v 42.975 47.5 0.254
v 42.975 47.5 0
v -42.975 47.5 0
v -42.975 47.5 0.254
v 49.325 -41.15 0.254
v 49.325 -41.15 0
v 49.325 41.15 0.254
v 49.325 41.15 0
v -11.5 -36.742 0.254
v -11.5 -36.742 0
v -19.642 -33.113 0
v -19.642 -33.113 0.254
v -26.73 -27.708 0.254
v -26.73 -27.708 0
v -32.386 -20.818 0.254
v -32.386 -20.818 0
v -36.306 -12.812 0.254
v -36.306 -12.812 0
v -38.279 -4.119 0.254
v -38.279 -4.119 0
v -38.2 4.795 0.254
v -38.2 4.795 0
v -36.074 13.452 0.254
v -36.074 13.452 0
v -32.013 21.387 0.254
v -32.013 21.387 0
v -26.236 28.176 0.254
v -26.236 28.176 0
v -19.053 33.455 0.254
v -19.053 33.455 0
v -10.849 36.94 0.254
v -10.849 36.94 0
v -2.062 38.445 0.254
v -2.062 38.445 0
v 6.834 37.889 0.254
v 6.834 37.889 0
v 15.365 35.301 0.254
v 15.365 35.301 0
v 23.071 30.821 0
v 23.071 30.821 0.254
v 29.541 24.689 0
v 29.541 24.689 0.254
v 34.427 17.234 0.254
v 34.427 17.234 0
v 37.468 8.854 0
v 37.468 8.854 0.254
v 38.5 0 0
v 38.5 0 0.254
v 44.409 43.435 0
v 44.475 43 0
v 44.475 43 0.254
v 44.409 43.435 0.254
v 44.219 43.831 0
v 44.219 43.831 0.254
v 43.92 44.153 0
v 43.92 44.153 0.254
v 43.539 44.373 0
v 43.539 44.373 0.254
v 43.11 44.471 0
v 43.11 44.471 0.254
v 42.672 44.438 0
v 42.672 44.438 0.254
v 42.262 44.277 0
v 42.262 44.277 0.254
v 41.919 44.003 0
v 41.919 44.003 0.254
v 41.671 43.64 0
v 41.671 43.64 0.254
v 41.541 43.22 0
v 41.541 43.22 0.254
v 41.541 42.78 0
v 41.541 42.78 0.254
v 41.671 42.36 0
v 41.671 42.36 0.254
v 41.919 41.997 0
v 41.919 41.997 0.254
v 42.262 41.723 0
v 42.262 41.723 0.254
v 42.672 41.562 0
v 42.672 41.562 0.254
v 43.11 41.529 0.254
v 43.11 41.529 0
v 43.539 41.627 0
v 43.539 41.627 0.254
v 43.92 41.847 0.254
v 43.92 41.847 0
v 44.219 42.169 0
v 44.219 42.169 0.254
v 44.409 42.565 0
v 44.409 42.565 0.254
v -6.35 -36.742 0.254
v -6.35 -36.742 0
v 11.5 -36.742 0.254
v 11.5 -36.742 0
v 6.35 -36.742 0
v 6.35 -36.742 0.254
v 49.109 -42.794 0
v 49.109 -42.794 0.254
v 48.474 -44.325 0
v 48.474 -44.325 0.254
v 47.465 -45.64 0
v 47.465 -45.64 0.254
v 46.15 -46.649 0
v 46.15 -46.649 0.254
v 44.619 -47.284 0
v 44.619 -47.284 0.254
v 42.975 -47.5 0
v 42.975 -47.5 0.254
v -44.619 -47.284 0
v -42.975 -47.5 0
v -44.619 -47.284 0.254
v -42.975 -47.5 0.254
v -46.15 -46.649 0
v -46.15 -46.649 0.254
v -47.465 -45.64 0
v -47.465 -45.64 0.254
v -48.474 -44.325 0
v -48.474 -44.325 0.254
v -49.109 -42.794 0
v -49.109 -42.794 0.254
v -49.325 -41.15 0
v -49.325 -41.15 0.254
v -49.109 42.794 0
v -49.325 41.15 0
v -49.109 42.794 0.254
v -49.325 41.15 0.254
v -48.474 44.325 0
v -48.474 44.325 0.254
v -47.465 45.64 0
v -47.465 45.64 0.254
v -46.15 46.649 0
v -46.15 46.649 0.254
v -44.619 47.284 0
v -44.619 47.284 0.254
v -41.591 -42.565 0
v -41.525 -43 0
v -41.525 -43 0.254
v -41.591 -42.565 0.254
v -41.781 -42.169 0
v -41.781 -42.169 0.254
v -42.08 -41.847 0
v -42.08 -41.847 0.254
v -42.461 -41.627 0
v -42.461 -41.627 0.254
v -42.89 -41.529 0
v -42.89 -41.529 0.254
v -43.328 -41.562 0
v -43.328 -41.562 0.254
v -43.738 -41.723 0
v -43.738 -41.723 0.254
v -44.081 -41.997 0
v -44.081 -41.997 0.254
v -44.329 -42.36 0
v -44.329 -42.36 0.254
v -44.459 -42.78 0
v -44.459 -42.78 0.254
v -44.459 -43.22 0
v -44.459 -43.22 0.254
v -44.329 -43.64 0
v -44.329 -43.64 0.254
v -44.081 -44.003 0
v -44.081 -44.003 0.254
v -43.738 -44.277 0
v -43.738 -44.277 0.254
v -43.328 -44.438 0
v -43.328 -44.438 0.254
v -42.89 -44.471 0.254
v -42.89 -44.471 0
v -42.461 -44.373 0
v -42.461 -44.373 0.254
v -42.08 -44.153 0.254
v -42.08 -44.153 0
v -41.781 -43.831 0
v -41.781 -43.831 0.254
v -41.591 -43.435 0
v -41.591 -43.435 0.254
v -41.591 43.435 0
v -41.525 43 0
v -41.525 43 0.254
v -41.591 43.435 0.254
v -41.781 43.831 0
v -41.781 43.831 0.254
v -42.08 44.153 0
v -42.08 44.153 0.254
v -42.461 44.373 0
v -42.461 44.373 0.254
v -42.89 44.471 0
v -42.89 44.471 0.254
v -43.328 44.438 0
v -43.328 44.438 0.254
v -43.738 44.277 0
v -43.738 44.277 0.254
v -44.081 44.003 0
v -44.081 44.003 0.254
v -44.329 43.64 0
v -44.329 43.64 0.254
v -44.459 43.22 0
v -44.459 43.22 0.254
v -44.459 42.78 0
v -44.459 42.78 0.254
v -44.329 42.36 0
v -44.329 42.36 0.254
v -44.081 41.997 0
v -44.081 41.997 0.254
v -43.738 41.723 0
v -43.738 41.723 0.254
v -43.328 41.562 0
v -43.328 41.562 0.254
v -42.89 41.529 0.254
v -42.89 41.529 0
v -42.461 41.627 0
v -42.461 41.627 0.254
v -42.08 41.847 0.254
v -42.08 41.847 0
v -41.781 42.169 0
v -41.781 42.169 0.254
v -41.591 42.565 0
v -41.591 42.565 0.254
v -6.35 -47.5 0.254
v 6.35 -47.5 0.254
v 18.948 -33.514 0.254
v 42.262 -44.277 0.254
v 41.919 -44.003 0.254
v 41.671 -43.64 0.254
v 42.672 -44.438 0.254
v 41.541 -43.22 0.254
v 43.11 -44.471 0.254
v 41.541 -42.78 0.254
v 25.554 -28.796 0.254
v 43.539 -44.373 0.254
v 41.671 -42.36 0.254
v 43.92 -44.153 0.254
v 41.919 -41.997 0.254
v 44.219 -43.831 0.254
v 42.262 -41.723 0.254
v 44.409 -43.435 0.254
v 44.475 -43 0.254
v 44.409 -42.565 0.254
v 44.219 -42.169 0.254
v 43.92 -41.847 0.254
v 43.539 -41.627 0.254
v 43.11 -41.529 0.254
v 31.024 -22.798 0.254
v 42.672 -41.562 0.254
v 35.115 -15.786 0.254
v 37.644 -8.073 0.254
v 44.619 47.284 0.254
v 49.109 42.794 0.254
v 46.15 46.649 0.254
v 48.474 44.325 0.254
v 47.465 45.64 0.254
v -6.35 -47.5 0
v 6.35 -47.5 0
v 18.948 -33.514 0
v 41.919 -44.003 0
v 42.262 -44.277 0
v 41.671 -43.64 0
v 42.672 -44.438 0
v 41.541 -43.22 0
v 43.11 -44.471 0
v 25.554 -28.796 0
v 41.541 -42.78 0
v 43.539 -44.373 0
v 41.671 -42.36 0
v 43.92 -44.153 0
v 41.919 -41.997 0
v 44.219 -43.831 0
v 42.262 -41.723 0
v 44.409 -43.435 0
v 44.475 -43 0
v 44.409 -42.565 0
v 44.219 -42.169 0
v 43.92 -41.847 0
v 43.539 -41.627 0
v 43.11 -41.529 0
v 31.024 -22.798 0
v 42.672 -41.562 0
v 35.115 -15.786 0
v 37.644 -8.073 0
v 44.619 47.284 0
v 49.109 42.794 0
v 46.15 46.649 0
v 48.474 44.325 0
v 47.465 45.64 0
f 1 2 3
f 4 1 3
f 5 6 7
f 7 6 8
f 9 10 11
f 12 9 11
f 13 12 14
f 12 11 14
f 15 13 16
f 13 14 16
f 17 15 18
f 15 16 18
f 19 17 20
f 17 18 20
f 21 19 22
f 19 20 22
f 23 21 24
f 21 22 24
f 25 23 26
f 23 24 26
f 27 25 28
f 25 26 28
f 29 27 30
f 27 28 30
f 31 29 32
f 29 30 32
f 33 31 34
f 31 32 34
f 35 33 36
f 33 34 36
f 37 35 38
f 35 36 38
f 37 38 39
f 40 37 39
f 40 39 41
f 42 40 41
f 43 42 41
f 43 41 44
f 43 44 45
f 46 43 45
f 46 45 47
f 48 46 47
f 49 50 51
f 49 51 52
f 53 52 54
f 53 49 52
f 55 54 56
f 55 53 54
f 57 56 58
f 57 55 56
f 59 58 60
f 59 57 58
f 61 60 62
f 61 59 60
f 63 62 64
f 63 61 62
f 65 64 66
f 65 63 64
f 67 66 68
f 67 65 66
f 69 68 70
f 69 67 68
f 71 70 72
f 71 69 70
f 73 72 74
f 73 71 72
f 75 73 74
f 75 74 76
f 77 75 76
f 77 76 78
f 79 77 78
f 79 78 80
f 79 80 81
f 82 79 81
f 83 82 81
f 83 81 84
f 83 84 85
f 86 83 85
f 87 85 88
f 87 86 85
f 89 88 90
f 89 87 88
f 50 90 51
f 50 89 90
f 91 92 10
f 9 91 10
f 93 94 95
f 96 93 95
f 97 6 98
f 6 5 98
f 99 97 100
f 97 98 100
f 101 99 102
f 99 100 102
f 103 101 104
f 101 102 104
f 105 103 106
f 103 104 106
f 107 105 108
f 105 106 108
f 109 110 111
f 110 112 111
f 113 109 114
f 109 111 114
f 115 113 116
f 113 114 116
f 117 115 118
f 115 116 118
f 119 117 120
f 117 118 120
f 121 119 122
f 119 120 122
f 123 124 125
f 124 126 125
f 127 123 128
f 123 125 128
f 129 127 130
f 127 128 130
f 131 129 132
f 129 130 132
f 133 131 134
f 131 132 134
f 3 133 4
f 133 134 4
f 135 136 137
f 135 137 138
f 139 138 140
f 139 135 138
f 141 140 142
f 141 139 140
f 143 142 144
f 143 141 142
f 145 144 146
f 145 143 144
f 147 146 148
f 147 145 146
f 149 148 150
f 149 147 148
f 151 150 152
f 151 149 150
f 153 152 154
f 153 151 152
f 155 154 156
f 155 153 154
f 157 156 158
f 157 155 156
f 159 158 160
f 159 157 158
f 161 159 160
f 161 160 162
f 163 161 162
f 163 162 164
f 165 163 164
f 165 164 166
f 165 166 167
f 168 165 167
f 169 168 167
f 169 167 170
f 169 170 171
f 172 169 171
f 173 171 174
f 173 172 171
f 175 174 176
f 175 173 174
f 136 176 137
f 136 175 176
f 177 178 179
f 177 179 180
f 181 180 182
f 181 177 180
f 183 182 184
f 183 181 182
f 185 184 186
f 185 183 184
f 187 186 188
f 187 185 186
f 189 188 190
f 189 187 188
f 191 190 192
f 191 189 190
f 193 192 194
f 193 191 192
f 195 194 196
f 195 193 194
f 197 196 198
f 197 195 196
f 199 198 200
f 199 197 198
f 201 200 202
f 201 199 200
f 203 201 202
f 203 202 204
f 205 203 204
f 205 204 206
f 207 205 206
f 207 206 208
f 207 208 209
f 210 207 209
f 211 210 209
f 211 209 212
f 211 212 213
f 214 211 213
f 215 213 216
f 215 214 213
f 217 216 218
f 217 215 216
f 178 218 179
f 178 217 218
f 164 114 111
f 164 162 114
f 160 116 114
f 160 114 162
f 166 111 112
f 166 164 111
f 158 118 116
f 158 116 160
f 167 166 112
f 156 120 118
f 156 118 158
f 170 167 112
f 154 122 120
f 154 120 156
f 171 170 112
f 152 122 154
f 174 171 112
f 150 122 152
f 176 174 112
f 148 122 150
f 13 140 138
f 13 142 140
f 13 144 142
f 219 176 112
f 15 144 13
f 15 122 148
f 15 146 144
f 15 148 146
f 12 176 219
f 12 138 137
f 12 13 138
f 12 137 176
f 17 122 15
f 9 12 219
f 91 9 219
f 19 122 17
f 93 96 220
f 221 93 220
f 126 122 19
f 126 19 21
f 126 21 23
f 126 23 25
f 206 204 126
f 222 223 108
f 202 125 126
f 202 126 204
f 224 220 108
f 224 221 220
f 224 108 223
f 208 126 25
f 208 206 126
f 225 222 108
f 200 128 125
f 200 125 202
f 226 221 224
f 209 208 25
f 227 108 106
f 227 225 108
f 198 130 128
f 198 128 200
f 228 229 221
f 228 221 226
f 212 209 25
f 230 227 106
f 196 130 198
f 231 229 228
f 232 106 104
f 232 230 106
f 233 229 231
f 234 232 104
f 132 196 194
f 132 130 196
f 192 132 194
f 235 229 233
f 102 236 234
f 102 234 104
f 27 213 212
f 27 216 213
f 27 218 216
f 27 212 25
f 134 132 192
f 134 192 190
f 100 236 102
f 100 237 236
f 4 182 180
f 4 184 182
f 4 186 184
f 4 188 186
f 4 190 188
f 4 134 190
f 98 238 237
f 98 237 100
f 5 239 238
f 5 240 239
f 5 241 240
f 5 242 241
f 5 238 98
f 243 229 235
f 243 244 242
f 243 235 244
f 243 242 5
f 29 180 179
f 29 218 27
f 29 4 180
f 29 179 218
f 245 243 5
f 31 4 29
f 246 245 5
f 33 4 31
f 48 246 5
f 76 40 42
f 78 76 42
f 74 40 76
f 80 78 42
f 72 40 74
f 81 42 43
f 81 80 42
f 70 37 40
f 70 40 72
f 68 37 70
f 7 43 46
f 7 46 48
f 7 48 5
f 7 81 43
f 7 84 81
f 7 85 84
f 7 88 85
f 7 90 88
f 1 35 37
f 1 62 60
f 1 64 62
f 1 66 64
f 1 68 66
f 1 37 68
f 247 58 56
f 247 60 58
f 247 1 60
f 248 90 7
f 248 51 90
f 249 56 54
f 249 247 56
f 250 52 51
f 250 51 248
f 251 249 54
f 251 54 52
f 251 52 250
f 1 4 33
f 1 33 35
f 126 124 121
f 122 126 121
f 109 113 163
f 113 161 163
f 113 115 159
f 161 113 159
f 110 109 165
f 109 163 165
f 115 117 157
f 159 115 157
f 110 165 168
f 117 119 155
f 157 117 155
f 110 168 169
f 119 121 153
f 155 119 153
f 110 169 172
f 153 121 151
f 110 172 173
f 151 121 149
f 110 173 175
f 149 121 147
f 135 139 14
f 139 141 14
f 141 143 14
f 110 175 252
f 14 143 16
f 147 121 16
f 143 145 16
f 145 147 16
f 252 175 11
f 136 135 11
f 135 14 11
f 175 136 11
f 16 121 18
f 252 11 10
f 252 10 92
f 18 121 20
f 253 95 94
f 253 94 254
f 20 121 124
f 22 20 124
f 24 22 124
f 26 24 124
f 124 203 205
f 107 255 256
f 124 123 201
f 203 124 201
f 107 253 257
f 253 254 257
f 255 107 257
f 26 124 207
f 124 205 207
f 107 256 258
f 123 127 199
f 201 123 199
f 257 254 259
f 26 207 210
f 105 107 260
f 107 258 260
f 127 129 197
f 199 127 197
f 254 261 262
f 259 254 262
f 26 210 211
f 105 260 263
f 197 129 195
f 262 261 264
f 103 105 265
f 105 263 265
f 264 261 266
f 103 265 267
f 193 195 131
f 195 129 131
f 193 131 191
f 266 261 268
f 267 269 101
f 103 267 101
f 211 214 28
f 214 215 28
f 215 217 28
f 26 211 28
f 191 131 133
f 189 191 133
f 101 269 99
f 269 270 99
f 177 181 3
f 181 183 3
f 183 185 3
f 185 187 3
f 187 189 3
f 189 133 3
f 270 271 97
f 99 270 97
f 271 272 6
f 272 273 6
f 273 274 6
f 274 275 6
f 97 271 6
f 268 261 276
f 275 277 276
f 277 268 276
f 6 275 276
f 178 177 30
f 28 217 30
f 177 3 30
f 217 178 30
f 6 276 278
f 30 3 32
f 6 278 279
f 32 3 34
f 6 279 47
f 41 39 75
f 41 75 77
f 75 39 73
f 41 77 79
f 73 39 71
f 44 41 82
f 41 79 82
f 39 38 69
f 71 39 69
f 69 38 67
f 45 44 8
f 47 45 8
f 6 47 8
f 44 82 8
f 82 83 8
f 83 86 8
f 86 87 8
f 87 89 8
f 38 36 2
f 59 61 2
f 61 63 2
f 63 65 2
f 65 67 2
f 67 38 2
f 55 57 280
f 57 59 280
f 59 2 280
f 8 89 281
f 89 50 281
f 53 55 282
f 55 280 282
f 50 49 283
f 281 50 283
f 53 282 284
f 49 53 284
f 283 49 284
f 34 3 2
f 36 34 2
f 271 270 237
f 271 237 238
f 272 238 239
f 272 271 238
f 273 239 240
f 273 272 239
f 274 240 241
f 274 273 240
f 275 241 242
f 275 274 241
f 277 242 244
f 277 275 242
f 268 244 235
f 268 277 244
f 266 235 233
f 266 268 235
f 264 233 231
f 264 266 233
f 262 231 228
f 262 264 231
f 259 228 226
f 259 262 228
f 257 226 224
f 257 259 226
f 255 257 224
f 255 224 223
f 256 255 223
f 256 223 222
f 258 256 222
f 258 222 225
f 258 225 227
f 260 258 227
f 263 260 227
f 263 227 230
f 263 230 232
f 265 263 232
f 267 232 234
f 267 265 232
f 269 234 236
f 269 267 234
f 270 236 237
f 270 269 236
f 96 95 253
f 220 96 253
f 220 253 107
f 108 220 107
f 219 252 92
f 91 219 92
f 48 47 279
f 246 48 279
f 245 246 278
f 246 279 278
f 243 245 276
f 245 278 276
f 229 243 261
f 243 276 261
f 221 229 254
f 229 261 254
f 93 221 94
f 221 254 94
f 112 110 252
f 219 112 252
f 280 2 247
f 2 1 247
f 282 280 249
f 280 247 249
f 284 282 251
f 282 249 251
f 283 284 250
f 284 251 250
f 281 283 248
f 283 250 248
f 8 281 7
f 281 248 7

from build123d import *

# Parameters (mm, degrees)
SKETCH2_R           = 1.475
BOSS_EXTRUDE1_DEPTH = 0.254
FILLET1_R           = 6.35


with BuildPart() as part:
    # Sketch2 → Boss-Extrude1 (new body)
    # profile 1 of 3: a face of its own
    with BuildSketch(Plane.XY):
        with BuildLine():
            ThreePointArc((-6.35, -37.972720471), (-8.946176851, -37.446173633), (-11.5, -36.742346142))
            ThreePointArc((-11.5, -36.742346142), (-22.79802623, 31.024184115), (38.5, 0))
            ThreePointArc((38.5, 0), (31.024184115, -22.79802623), (11.5, -36.742346142))
            ThreePointArc((11.5, -36.742346142), (8.946176851, -37.446173633), (6.35, -37.972720471))
            Line((6.35, -37.972720471), (6.35, -47.5))
            Line((6.35, -47.5), (49.325, -47.5))
            Line((49.325, -47.5), (49.325, 47.5))
            Line((49.325, 47.5), (-49.325, 47.5))
            Line((-49.325, 47.5), (-49.325, -47.5))
            Line((-49.325, -47.5), (-6.35, -47.5))
            Line((-6.35, -47.5), (-6.35, -37.972720471))
        make_face()
        with Locations((-43, -43)):
            Circle(SKETCH2_R, mode=Mode.SUBTRACT)
        with Locations((43, -43)):
            Circle(SKETCH2_R, mode=Mode.SUBTRACT)
        with Locations((-43, 43)):
            Circle(SKETCH2_R, mode=Mode.SUBTRACT)
        with Locations((43, 43)):
            Circle(SKETCH2_R, mode=Mode.SUBTRACT)
    # profile 2 of 3: a face of its own
    with BuildSketch(Plane.XY):
        with BuildLine():
            Line((11.5, -36.742346142), (6.35, -36.742346142))
            Line((6.35, -36.742346142), (6.35, -37.972720471))
            ThreePointArc((6.35, -37.972720471), (8.946176851, -37.446173633), (11.5, -36.742346142))
        make_face()
    # profile 3 of 3: a face of its own
    with BuildSketch(Plane.XY):
        with BuildLine():
            Line((-6.35, -36.742346142), (-11.5, -36.742346142))
            ThreePointArc((-11.5, -36.742346142), (-8.946176851, -37.446173633), (-6.35, -37.972720471))
            Line((-6.35, -37.972720471), (-6.35, -36.742346142))
        make_face()
    extrude(amount=BOSS_EXTRUDE1_DEPTH)

    # Fillet1
    fillet1_edges = [part.edges().sort_by_distance(p)[0] for p in [
        (-49.325, -47.5, 0.127),
        (-49.325, 47.5, 0.127),
        (49.325, 47.5, 0.127),
        (49.325, -47.5, 0.127),
    ]]
    fillet(fillet1_edges, radius=FILLET1_R)


solid = part.part
